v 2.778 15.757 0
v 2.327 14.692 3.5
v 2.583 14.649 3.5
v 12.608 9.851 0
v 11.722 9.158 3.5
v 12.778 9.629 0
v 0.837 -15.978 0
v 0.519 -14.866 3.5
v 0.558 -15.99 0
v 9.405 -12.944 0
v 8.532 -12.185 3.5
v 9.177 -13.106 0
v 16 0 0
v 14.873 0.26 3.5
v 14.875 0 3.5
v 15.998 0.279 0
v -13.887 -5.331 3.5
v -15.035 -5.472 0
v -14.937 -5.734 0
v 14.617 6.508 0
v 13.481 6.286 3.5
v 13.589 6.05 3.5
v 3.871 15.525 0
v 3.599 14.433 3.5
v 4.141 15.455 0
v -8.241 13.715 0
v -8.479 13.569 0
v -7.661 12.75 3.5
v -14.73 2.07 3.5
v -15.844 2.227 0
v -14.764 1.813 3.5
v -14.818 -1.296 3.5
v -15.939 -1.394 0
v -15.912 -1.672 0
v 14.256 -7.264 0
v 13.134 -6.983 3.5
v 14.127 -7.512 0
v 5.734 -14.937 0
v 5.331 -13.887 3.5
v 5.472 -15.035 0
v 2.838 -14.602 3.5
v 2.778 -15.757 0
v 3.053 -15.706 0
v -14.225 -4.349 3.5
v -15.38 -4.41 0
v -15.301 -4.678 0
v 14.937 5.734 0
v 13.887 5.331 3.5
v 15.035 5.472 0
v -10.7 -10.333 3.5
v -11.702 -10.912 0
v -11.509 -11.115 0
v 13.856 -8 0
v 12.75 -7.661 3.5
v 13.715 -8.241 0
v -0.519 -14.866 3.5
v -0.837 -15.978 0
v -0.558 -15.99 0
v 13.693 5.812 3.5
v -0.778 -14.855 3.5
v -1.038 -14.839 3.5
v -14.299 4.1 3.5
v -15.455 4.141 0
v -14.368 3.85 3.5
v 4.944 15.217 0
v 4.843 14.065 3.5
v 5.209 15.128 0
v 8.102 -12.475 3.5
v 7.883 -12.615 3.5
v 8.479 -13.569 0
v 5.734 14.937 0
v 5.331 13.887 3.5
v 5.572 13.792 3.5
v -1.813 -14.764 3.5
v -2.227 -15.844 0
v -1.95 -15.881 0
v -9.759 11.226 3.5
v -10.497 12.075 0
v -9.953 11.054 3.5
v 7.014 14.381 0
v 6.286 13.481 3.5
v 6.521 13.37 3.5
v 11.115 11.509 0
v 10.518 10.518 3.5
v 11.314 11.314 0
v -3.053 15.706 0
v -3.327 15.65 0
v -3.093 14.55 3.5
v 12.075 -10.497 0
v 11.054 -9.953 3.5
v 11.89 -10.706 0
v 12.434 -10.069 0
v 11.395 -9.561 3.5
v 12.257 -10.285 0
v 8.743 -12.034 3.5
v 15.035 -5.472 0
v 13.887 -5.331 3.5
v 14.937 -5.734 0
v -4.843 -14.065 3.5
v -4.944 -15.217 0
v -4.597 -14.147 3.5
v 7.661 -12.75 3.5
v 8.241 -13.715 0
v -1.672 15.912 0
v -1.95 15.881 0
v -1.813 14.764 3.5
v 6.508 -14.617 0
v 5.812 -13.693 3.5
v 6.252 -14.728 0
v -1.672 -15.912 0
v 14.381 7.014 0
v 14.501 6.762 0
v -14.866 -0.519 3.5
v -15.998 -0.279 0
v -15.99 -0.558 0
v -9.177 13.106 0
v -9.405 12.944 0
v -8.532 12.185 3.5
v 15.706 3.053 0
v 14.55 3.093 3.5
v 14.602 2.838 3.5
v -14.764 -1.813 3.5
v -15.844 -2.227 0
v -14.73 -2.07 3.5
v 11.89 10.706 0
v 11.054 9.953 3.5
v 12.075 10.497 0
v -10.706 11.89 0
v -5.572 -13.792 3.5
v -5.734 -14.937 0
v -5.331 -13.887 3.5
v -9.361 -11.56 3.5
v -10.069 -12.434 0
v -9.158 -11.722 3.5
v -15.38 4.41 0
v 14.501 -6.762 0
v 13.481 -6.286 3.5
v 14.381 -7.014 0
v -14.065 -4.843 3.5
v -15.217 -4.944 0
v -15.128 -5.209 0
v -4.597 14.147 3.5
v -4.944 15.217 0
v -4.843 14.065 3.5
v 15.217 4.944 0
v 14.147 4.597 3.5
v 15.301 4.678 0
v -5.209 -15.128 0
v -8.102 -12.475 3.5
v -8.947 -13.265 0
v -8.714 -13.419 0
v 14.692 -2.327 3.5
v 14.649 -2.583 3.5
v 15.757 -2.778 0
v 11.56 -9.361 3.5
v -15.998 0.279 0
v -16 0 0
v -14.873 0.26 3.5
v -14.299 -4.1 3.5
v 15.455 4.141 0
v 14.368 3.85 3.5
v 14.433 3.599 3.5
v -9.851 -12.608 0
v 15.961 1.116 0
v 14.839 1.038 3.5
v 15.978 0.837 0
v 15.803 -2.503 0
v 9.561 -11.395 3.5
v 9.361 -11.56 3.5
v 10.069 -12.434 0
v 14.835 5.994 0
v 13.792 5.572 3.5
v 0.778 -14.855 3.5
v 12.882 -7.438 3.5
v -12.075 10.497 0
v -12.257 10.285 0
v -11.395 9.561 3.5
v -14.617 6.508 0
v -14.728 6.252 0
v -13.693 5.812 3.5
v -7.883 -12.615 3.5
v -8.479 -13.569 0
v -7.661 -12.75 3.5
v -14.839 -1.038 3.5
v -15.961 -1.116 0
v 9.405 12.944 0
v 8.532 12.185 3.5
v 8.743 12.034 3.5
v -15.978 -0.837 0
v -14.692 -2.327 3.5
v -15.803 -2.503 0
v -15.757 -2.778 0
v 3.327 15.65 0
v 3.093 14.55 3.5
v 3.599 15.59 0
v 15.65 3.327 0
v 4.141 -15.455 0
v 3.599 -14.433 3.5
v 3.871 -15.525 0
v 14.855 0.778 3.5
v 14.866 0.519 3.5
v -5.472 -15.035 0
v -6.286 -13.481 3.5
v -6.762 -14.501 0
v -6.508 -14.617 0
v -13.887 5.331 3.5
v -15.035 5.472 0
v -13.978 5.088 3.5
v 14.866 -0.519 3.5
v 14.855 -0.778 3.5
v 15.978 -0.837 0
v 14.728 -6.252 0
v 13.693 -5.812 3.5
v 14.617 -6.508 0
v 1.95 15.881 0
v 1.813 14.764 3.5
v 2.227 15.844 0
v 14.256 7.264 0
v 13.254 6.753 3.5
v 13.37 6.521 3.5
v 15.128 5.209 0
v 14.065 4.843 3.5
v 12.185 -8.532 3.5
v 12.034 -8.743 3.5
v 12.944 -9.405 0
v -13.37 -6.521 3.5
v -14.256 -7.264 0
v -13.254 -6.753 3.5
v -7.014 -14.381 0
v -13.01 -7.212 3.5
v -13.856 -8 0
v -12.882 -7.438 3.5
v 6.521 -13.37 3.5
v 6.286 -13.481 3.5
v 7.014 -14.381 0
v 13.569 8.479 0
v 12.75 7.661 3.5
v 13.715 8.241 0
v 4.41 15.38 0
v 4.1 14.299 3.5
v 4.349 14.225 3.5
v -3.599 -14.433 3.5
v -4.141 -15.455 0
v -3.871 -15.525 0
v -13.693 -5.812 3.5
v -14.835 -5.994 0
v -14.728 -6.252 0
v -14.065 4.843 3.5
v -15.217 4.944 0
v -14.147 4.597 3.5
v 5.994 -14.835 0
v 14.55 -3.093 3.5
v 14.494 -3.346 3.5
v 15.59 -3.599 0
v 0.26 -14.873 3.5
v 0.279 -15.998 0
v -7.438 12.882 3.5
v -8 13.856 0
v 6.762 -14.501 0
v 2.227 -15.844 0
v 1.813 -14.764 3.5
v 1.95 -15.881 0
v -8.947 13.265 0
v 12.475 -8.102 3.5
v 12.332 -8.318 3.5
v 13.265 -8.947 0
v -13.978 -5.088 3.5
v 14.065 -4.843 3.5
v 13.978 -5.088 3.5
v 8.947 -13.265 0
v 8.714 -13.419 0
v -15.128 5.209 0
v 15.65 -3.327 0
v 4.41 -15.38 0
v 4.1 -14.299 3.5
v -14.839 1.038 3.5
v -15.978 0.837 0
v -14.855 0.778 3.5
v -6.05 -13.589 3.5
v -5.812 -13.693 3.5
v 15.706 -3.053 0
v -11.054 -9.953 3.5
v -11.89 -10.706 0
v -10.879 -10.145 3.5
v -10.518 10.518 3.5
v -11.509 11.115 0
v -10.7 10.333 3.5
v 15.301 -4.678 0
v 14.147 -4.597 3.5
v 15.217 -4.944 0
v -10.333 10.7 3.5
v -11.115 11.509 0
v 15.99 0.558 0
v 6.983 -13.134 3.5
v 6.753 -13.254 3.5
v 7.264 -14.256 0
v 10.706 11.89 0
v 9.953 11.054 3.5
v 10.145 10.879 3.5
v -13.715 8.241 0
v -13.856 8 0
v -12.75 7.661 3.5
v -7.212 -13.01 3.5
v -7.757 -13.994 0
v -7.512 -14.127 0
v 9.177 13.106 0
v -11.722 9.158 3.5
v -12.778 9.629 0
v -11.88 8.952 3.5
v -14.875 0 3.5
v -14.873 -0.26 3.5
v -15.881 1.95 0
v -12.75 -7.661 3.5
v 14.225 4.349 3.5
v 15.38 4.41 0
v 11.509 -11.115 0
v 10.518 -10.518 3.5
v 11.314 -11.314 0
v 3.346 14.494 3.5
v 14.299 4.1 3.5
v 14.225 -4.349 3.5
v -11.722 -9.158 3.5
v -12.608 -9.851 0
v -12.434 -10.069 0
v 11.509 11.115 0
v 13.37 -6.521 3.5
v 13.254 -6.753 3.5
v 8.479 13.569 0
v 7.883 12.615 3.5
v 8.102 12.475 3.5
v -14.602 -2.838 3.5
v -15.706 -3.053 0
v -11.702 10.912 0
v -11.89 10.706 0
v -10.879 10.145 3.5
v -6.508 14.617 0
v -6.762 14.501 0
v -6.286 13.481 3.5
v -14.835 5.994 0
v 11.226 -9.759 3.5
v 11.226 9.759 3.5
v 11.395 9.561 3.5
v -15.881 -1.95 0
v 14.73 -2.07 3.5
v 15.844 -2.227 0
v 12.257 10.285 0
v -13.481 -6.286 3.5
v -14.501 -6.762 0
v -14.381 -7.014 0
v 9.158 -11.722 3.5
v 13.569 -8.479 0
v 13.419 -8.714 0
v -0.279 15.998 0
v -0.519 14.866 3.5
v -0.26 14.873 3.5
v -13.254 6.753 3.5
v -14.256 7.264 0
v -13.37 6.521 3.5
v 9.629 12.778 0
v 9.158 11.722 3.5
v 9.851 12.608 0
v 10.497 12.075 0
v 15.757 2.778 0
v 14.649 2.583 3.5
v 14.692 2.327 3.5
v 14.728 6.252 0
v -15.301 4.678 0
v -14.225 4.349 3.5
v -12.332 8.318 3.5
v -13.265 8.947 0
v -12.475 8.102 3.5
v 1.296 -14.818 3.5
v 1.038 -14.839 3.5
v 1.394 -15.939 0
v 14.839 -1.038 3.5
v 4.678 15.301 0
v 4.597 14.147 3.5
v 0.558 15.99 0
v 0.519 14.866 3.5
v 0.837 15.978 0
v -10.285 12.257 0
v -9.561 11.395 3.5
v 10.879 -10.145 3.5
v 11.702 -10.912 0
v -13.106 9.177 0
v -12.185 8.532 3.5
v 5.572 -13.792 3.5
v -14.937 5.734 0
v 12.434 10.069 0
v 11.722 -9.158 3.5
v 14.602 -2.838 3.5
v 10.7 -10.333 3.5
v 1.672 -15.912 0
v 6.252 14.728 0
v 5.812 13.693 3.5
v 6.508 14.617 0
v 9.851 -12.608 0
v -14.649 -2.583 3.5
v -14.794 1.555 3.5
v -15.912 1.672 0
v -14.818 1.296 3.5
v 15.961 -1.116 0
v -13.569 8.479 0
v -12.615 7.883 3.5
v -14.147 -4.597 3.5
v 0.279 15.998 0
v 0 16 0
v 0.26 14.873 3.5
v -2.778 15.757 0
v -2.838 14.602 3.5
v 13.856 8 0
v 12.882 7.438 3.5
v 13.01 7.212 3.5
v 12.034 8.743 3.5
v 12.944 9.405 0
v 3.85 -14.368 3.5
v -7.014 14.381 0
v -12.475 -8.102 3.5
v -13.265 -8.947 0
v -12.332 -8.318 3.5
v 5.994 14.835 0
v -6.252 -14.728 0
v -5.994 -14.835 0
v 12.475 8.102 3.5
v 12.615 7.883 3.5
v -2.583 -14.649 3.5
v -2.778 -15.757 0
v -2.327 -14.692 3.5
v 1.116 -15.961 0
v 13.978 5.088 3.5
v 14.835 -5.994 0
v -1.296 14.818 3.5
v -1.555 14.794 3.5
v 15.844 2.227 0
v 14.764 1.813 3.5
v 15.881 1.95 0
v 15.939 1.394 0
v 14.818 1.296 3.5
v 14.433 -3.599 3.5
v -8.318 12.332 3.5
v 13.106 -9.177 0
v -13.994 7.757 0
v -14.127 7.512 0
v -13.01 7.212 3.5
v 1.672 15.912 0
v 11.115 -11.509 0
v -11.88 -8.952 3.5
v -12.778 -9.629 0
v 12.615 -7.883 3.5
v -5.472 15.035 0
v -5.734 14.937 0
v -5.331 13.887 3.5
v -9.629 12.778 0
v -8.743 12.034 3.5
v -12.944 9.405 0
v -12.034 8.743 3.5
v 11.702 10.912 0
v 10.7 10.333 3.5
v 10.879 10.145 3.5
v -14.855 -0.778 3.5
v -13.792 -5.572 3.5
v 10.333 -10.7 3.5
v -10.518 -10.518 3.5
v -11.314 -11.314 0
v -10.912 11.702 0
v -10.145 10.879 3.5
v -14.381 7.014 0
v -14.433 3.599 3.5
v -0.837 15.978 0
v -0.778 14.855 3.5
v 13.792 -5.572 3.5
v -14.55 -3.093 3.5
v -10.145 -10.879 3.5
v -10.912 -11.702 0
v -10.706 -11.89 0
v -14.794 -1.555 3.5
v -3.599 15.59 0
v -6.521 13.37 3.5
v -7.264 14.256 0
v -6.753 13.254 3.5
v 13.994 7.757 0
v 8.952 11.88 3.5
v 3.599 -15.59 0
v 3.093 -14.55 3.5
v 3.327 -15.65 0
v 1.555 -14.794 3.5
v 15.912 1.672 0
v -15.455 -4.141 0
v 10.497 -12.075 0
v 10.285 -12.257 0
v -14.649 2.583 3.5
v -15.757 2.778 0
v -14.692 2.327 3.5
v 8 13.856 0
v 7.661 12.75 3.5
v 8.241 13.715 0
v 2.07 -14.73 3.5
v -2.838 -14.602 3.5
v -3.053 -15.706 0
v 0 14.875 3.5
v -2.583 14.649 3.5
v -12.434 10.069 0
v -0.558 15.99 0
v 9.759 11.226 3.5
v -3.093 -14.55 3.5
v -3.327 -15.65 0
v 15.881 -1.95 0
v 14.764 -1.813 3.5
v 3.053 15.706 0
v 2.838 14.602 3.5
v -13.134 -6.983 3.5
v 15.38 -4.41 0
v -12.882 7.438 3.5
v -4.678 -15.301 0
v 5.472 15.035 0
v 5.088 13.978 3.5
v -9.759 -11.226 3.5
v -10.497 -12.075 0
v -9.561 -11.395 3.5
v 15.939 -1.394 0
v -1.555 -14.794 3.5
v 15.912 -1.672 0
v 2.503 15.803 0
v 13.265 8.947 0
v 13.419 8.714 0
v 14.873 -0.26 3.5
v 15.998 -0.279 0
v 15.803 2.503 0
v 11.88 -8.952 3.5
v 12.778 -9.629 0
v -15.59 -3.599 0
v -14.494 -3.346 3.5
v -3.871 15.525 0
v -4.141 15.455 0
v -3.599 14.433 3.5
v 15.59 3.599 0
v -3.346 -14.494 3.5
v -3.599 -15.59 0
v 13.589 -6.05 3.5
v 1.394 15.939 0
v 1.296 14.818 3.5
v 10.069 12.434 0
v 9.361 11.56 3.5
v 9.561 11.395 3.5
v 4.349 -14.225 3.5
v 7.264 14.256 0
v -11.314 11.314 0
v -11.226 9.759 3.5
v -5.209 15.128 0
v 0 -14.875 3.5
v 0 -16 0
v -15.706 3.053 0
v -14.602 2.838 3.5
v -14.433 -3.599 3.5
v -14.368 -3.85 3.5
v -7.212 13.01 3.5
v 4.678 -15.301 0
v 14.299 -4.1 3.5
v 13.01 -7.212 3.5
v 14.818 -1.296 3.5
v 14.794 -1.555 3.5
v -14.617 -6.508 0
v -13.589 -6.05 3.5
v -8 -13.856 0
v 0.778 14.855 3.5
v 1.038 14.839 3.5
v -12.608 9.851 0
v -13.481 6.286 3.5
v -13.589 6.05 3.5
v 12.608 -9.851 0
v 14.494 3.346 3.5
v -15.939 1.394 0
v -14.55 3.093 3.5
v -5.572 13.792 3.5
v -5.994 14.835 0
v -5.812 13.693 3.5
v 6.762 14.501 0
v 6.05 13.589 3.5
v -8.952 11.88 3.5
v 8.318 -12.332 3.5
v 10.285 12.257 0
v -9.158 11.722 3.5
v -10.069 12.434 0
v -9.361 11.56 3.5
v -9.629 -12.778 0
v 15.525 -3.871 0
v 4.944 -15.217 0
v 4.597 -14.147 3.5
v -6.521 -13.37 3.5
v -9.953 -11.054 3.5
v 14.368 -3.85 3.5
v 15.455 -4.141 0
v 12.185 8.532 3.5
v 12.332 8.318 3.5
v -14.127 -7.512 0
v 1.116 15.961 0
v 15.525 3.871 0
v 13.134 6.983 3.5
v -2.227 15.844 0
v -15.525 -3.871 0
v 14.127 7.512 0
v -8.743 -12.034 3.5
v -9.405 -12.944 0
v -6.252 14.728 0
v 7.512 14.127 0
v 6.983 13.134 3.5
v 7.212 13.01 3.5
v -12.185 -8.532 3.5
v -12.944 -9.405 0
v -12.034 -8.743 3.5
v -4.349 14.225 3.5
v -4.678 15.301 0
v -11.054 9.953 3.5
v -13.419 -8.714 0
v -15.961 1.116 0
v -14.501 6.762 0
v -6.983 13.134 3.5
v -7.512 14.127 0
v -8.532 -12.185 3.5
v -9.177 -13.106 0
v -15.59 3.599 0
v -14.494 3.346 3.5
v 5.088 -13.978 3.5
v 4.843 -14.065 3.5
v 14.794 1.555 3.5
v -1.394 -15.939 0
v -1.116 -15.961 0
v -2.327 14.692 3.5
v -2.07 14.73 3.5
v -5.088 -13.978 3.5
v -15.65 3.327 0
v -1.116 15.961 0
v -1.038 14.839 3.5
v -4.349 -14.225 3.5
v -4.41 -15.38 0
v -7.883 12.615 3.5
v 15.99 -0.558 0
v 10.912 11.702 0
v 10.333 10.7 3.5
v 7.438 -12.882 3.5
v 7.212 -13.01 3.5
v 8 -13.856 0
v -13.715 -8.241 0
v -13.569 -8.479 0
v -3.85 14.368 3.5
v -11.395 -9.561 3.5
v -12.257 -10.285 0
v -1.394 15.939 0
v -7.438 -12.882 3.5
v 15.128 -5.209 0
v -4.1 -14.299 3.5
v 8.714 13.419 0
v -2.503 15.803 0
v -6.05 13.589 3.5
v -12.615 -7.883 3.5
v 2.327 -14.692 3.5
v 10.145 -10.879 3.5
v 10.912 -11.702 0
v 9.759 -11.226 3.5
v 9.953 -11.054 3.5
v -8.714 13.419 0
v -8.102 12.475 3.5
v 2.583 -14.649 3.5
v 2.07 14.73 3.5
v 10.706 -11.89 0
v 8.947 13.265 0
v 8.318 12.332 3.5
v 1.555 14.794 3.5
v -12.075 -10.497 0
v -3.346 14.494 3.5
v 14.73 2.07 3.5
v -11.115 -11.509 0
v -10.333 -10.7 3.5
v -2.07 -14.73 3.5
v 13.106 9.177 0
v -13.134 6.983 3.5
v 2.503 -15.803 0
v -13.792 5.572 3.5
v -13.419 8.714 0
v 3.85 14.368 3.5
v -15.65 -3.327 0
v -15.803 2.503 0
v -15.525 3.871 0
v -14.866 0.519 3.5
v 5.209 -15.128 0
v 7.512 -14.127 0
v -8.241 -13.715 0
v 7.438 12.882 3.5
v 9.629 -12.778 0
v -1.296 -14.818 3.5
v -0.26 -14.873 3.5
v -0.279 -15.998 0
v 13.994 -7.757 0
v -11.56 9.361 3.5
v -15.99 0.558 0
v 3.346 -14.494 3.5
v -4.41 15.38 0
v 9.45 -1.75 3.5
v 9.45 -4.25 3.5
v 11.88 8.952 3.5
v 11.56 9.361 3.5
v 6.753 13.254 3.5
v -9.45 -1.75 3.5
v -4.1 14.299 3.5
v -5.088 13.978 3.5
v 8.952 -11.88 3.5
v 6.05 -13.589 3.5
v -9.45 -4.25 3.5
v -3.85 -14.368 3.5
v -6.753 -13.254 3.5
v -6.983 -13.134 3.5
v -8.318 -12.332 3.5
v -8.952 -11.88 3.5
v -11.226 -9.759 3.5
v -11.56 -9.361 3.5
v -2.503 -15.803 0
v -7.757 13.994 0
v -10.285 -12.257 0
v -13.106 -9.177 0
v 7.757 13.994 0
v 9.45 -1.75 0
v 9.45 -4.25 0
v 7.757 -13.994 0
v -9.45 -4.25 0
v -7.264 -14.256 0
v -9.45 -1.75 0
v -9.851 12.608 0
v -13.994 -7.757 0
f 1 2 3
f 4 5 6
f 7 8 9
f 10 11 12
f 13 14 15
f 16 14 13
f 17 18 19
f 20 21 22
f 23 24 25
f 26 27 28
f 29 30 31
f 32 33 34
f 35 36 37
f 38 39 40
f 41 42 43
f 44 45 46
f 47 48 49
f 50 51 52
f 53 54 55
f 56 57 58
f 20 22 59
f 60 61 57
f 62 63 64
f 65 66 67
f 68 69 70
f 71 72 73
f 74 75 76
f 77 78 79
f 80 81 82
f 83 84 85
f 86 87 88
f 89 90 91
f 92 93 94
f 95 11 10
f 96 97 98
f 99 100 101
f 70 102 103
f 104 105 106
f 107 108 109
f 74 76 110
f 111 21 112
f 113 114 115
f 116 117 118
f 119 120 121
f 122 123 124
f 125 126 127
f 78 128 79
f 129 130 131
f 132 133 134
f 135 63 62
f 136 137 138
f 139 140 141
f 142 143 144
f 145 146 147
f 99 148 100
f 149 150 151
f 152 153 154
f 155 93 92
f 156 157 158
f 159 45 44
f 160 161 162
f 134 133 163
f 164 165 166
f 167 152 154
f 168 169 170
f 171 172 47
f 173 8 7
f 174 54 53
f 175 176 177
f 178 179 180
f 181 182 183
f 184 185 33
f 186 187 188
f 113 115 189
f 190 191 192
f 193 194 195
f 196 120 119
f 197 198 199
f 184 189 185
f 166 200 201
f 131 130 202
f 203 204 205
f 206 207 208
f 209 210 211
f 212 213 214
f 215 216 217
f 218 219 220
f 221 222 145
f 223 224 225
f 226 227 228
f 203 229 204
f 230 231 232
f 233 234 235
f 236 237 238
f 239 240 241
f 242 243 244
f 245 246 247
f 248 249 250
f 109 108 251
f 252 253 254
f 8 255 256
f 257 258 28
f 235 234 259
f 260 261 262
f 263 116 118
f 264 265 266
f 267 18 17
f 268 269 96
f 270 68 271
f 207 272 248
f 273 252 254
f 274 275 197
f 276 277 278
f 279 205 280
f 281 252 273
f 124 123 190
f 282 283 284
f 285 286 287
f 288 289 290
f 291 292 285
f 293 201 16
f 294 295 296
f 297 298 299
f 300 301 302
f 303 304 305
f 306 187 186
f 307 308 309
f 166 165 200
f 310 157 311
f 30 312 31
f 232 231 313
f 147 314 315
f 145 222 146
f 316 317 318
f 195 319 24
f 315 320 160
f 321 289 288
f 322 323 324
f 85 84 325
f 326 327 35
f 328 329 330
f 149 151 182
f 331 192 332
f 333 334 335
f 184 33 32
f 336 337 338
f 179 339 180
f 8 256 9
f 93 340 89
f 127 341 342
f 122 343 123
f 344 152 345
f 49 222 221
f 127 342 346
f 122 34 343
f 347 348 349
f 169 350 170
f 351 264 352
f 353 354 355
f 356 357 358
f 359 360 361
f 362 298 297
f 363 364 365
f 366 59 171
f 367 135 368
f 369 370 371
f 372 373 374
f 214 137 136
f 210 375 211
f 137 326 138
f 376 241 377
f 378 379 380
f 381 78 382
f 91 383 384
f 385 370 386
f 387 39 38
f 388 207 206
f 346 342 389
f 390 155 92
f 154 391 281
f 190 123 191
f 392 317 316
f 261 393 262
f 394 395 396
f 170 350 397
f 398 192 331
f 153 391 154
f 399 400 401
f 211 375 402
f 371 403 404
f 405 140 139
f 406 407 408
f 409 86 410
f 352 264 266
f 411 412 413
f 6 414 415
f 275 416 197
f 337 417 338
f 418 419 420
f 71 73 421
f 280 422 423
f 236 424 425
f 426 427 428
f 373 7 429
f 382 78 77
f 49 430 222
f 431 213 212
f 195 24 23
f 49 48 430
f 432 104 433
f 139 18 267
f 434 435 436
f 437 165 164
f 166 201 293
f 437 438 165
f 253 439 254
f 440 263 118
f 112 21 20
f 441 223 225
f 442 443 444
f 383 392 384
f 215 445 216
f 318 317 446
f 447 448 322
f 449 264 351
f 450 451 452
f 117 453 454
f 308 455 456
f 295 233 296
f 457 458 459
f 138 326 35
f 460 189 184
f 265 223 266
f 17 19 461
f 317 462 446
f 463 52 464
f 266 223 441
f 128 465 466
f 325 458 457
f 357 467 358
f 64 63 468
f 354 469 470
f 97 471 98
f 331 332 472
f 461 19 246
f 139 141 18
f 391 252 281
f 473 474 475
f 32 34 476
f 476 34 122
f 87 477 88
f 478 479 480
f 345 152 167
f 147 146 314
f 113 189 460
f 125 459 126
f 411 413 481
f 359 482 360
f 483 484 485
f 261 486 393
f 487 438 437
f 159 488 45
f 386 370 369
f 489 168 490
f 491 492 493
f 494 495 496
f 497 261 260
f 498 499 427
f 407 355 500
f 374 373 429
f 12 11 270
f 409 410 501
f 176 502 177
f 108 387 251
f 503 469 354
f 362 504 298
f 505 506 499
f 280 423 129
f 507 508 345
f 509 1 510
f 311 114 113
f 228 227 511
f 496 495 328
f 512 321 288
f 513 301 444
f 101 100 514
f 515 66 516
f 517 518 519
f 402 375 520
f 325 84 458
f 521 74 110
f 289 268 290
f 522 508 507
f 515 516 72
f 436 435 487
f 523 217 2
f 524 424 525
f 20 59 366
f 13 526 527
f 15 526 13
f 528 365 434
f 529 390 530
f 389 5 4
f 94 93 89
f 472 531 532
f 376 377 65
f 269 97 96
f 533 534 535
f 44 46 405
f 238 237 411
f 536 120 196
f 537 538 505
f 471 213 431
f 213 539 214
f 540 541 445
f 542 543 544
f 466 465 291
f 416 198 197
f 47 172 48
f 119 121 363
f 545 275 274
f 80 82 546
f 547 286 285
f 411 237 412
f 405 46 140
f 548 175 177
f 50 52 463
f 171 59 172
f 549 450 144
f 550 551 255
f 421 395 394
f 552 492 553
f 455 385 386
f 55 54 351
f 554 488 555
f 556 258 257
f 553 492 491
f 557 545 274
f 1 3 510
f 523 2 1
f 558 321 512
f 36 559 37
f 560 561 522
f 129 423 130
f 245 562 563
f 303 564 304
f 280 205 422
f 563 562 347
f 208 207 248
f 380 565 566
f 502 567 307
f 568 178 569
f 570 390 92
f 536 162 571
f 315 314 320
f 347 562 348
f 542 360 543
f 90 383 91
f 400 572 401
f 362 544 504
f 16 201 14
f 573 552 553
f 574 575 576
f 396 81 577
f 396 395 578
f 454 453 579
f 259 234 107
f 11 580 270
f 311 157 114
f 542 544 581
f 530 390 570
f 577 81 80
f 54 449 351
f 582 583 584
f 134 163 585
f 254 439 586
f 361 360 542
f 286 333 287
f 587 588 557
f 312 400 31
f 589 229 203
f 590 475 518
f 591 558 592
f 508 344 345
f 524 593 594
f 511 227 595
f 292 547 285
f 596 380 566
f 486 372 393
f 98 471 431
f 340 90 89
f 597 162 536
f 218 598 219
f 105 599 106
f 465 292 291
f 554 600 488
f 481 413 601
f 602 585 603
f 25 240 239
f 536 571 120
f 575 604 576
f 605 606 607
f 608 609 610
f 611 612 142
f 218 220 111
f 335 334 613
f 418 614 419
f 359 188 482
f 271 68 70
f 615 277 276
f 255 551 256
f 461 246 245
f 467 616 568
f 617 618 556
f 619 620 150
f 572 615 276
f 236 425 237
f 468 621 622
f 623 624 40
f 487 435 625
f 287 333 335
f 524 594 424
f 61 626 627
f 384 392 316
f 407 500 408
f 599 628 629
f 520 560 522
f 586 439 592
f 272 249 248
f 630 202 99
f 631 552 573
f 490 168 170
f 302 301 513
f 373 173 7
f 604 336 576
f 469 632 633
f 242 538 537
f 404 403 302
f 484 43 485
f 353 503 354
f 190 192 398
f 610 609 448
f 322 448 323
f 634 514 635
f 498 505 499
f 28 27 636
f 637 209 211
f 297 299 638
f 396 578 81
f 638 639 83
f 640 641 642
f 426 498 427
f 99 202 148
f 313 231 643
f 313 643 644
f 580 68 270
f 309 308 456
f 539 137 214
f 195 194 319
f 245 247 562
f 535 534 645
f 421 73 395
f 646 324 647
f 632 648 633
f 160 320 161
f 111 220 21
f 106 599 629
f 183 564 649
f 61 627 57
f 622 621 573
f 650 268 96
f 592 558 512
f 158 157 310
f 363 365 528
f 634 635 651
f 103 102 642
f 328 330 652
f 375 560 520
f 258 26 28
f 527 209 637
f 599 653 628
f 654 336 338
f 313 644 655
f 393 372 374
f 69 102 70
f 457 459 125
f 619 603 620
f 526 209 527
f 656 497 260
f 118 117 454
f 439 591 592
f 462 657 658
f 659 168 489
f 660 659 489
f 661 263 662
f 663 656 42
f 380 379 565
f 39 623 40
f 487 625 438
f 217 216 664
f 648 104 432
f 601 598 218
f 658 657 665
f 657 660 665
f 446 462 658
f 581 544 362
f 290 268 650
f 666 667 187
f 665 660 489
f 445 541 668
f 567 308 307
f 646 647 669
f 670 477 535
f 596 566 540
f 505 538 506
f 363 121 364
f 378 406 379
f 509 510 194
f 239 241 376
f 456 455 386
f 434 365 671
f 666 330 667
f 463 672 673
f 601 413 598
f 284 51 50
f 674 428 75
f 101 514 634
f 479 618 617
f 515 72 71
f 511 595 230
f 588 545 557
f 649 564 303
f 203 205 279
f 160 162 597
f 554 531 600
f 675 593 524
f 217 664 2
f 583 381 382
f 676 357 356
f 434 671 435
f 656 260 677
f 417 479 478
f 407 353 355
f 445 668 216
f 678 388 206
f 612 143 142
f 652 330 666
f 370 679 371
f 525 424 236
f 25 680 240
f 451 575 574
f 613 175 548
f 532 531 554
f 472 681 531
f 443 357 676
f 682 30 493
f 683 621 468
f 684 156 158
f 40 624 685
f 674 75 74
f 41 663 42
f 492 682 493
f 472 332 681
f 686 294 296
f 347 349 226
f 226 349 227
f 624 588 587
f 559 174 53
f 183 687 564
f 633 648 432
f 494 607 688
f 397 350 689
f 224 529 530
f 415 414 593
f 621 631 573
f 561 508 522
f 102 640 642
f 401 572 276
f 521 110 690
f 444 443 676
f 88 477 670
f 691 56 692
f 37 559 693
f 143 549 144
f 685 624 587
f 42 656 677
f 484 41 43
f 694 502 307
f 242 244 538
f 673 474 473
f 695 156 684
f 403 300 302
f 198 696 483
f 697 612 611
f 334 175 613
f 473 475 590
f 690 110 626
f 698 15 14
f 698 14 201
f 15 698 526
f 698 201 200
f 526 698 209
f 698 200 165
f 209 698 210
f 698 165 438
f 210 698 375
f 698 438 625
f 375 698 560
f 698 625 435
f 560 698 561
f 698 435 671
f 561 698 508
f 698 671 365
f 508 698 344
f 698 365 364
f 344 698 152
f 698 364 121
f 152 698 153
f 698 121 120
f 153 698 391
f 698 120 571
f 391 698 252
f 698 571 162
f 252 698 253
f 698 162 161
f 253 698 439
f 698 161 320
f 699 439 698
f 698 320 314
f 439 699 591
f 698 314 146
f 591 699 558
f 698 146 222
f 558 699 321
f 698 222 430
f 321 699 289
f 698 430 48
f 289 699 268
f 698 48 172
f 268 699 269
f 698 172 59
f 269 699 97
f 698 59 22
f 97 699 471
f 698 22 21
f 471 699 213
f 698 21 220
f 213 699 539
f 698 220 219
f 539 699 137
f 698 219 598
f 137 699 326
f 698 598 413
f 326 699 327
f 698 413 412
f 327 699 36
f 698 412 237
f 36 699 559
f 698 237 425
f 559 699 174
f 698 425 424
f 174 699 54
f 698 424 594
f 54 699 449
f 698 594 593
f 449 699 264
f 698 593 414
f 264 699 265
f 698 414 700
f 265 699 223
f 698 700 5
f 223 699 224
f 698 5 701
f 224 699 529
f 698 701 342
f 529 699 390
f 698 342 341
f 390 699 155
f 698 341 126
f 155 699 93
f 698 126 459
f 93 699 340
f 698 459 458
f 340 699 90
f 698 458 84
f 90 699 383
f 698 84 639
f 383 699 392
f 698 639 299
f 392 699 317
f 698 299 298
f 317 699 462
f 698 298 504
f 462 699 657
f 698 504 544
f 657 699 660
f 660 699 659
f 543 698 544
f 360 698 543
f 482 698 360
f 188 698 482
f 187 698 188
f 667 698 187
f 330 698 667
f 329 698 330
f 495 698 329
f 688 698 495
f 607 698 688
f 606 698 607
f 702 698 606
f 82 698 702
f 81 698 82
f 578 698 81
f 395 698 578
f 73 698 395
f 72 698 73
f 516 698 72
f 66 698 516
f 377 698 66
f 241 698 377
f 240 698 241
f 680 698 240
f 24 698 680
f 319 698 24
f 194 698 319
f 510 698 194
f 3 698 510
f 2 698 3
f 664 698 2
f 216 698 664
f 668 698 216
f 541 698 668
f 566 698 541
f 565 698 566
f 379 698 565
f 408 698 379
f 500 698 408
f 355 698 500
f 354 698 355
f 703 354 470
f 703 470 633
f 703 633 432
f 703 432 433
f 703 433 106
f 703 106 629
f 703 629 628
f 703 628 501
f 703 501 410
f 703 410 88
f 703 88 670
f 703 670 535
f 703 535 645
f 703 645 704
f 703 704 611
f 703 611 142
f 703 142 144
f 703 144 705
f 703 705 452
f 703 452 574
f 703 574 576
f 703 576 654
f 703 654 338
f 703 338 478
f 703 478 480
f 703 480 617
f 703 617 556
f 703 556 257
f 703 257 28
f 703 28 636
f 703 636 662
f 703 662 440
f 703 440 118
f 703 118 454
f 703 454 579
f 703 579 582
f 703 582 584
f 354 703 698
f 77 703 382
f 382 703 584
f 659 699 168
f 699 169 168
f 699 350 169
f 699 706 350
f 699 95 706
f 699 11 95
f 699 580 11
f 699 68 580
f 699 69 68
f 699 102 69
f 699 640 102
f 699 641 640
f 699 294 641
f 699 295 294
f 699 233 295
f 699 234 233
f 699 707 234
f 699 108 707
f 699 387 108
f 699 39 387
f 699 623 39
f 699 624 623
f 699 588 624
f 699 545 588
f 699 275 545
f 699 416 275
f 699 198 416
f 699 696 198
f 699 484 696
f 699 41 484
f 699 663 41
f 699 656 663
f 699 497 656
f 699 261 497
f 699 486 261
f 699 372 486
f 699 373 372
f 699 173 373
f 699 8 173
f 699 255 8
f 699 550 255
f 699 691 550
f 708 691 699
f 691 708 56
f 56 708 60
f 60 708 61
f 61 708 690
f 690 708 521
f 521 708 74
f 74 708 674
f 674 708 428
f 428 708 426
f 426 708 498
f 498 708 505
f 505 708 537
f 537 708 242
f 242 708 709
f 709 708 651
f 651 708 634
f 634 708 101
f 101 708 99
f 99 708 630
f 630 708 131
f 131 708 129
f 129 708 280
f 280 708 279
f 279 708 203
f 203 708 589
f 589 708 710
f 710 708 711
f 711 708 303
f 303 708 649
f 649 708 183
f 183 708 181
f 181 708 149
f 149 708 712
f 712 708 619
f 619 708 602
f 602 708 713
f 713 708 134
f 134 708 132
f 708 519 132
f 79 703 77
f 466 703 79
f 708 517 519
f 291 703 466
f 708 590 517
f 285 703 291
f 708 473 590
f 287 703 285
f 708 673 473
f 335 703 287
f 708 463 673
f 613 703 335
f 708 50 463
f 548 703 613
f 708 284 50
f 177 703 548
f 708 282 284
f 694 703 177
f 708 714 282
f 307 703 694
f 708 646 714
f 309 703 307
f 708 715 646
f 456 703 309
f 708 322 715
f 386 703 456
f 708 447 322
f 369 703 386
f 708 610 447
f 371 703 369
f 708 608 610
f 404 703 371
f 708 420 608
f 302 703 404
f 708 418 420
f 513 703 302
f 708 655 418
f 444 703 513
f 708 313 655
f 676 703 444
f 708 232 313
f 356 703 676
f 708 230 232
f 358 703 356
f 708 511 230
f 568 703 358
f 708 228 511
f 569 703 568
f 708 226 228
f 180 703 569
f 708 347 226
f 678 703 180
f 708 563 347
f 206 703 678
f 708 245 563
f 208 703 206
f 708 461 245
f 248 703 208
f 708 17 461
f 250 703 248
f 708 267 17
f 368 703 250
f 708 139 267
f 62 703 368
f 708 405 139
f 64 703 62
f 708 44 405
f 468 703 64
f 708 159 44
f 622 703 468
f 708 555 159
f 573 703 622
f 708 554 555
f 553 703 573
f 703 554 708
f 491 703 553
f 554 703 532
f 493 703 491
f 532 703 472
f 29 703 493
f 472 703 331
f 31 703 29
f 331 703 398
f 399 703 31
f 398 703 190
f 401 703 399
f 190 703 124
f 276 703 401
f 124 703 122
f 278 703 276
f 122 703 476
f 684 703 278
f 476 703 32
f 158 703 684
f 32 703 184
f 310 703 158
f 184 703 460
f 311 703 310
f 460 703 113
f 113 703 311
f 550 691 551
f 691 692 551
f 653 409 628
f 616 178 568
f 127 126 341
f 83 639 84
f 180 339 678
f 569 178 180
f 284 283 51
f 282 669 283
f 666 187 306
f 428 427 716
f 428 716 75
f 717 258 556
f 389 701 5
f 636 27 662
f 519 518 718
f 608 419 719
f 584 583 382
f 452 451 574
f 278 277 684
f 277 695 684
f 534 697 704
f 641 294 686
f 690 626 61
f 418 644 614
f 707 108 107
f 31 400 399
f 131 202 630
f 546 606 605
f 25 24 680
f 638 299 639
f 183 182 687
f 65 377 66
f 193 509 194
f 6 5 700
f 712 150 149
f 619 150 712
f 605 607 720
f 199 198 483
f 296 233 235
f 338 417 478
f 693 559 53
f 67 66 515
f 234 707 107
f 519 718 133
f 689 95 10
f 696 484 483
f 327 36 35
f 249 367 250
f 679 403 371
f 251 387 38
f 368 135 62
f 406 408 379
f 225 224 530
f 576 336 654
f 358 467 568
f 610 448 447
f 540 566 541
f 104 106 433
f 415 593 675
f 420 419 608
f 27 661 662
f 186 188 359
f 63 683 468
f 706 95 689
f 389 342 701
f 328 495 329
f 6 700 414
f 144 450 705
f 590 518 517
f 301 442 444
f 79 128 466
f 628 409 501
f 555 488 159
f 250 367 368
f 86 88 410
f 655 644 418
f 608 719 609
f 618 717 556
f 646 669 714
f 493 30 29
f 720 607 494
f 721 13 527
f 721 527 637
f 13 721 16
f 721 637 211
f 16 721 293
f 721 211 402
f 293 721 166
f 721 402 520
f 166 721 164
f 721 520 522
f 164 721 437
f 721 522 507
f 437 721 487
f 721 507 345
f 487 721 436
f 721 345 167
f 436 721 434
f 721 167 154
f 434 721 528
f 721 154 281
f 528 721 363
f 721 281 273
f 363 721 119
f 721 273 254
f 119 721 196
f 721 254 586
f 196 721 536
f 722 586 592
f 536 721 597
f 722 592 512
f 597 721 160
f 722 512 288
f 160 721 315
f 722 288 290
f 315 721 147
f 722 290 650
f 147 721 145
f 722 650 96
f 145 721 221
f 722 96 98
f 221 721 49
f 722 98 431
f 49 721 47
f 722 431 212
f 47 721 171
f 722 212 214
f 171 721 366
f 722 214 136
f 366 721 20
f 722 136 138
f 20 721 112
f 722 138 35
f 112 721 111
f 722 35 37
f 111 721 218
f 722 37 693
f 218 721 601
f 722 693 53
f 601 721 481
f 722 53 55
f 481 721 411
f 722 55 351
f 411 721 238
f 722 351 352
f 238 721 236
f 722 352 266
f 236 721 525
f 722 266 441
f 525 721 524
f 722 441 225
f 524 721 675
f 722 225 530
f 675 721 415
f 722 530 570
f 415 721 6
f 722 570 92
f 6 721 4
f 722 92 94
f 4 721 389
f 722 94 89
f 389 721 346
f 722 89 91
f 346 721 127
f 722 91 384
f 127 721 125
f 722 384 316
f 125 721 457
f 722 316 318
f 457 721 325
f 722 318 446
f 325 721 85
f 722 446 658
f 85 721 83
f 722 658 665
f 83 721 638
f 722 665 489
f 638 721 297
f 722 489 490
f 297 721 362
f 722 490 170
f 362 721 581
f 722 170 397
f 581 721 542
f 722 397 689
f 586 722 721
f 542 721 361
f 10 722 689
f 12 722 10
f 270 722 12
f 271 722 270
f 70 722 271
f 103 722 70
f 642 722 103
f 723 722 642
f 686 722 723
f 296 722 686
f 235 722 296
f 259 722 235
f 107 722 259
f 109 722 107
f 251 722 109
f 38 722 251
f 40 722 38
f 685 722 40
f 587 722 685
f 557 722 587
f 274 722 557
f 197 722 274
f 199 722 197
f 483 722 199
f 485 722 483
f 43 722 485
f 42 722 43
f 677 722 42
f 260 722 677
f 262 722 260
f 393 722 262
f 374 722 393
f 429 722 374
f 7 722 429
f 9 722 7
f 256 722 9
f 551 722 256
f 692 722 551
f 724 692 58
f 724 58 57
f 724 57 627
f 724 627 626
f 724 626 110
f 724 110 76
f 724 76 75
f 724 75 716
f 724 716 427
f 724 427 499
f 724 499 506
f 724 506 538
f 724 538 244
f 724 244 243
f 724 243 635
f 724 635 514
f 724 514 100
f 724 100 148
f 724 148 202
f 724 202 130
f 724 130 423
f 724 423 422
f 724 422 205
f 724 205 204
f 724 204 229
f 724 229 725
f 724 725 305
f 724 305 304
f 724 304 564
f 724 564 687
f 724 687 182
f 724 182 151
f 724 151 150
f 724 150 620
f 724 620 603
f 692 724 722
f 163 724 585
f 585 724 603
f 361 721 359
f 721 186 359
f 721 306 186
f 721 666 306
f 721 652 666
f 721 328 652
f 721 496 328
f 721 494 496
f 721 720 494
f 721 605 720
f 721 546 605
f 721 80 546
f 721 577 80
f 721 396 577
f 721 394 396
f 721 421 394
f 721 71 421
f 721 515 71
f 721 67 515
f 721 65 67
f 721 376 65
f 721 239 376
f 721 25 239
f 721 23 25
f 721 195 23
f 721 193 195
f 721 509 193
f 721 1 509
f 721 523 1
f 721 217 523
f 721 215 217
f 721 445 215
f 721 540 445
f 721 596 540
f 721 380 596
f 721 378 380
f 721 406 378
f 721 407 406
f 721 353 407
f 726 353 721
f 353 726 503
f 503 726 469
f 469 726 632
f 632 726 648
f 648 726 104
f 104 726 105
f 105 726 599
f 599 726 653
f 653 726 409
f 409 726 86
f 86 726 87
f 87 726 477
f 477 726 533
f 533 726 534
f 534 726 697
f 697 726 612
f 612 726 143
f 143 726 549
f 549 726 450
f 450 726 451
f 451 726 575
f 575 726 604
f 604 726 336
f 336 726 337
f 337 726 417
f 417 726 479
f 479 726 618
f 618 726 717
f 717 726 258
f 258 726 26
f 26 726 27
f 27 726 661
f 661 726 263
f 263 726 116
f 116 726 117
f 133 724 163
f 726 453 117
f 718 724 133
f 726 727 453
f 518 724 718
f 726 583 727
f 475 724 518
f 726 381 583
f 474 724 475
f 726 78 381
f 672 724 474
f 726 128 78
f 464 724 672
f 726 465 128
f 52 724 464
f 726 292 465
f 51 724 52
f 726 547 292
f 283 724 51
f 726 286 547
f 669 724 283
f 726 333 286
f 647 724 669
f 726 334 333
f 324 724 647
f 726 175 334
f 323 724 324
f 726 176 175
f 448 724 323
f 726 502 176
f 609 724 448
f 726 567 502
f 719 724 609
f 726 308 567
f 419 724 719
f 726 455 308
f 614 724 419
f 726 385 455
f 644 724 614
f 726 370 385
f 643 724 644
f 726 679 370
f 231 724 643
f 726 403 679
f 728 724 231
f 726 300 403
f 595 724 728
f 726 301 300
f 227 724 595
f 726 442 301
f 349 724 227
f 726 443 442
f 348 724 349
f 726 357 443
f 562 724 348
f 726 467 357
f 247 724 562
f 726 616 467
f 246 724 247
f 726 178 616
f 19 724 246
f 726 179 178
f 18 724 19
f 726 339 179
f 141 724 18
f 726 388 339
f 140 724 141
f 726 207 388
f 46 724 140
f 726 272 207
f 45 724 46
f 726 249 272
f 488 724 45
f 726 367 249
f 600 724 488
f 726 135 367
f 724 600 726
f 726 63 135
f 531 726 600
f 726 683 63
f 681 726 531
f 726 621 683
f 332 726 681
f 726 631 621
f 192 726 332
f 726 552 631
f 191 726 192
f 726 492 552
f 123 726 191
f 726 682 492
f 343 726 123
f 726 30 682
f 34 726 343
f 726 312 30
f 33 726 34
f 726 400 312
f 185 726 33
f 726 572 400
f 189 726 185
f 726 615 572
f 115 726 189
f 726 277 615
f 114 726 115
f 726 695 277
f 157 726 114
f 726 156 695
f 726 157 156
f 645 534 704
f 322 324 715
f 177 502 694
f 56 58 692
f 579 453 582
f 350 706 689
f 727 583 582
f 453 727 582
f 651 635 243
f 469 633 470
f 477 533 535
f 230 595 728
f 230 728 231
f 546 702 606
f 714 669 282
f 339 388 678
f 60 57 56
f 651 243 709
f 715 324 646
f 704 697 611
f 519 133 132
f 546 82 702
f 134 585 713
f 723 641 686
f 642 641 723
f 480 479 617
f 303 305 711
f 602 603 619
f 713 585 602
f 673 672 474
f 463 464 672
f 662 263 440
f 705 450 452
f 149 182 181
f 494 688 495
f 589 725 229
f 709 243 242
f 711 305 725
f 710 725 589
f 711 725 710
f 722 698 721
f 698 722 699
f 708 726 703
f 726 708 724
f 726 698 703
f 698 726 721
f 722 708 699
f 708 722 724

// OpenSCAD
// file: oblong.scad
module ellipse_base(x, y,z, slot=[], shift=[0,0]) {
    difference() {
    scale([y/x, 1.0,1.0])
        cylinder(d1=x,d2=x-2.25,h=z, $fs=0.2, $fa=1);
        if (slot != []) {
            translate([shift[0],shift[1],z/2])
            cube([slot[0], slot[1], z+4], center=true);
        }
    }
}

ellipse_base(32,32, 3.5, [18.9, 2.5], [0, -3]);
// main file
use<oblong.scad>
ellipse_base(32,32, 3.5, [18.9, 2.5], [0, -3]);
